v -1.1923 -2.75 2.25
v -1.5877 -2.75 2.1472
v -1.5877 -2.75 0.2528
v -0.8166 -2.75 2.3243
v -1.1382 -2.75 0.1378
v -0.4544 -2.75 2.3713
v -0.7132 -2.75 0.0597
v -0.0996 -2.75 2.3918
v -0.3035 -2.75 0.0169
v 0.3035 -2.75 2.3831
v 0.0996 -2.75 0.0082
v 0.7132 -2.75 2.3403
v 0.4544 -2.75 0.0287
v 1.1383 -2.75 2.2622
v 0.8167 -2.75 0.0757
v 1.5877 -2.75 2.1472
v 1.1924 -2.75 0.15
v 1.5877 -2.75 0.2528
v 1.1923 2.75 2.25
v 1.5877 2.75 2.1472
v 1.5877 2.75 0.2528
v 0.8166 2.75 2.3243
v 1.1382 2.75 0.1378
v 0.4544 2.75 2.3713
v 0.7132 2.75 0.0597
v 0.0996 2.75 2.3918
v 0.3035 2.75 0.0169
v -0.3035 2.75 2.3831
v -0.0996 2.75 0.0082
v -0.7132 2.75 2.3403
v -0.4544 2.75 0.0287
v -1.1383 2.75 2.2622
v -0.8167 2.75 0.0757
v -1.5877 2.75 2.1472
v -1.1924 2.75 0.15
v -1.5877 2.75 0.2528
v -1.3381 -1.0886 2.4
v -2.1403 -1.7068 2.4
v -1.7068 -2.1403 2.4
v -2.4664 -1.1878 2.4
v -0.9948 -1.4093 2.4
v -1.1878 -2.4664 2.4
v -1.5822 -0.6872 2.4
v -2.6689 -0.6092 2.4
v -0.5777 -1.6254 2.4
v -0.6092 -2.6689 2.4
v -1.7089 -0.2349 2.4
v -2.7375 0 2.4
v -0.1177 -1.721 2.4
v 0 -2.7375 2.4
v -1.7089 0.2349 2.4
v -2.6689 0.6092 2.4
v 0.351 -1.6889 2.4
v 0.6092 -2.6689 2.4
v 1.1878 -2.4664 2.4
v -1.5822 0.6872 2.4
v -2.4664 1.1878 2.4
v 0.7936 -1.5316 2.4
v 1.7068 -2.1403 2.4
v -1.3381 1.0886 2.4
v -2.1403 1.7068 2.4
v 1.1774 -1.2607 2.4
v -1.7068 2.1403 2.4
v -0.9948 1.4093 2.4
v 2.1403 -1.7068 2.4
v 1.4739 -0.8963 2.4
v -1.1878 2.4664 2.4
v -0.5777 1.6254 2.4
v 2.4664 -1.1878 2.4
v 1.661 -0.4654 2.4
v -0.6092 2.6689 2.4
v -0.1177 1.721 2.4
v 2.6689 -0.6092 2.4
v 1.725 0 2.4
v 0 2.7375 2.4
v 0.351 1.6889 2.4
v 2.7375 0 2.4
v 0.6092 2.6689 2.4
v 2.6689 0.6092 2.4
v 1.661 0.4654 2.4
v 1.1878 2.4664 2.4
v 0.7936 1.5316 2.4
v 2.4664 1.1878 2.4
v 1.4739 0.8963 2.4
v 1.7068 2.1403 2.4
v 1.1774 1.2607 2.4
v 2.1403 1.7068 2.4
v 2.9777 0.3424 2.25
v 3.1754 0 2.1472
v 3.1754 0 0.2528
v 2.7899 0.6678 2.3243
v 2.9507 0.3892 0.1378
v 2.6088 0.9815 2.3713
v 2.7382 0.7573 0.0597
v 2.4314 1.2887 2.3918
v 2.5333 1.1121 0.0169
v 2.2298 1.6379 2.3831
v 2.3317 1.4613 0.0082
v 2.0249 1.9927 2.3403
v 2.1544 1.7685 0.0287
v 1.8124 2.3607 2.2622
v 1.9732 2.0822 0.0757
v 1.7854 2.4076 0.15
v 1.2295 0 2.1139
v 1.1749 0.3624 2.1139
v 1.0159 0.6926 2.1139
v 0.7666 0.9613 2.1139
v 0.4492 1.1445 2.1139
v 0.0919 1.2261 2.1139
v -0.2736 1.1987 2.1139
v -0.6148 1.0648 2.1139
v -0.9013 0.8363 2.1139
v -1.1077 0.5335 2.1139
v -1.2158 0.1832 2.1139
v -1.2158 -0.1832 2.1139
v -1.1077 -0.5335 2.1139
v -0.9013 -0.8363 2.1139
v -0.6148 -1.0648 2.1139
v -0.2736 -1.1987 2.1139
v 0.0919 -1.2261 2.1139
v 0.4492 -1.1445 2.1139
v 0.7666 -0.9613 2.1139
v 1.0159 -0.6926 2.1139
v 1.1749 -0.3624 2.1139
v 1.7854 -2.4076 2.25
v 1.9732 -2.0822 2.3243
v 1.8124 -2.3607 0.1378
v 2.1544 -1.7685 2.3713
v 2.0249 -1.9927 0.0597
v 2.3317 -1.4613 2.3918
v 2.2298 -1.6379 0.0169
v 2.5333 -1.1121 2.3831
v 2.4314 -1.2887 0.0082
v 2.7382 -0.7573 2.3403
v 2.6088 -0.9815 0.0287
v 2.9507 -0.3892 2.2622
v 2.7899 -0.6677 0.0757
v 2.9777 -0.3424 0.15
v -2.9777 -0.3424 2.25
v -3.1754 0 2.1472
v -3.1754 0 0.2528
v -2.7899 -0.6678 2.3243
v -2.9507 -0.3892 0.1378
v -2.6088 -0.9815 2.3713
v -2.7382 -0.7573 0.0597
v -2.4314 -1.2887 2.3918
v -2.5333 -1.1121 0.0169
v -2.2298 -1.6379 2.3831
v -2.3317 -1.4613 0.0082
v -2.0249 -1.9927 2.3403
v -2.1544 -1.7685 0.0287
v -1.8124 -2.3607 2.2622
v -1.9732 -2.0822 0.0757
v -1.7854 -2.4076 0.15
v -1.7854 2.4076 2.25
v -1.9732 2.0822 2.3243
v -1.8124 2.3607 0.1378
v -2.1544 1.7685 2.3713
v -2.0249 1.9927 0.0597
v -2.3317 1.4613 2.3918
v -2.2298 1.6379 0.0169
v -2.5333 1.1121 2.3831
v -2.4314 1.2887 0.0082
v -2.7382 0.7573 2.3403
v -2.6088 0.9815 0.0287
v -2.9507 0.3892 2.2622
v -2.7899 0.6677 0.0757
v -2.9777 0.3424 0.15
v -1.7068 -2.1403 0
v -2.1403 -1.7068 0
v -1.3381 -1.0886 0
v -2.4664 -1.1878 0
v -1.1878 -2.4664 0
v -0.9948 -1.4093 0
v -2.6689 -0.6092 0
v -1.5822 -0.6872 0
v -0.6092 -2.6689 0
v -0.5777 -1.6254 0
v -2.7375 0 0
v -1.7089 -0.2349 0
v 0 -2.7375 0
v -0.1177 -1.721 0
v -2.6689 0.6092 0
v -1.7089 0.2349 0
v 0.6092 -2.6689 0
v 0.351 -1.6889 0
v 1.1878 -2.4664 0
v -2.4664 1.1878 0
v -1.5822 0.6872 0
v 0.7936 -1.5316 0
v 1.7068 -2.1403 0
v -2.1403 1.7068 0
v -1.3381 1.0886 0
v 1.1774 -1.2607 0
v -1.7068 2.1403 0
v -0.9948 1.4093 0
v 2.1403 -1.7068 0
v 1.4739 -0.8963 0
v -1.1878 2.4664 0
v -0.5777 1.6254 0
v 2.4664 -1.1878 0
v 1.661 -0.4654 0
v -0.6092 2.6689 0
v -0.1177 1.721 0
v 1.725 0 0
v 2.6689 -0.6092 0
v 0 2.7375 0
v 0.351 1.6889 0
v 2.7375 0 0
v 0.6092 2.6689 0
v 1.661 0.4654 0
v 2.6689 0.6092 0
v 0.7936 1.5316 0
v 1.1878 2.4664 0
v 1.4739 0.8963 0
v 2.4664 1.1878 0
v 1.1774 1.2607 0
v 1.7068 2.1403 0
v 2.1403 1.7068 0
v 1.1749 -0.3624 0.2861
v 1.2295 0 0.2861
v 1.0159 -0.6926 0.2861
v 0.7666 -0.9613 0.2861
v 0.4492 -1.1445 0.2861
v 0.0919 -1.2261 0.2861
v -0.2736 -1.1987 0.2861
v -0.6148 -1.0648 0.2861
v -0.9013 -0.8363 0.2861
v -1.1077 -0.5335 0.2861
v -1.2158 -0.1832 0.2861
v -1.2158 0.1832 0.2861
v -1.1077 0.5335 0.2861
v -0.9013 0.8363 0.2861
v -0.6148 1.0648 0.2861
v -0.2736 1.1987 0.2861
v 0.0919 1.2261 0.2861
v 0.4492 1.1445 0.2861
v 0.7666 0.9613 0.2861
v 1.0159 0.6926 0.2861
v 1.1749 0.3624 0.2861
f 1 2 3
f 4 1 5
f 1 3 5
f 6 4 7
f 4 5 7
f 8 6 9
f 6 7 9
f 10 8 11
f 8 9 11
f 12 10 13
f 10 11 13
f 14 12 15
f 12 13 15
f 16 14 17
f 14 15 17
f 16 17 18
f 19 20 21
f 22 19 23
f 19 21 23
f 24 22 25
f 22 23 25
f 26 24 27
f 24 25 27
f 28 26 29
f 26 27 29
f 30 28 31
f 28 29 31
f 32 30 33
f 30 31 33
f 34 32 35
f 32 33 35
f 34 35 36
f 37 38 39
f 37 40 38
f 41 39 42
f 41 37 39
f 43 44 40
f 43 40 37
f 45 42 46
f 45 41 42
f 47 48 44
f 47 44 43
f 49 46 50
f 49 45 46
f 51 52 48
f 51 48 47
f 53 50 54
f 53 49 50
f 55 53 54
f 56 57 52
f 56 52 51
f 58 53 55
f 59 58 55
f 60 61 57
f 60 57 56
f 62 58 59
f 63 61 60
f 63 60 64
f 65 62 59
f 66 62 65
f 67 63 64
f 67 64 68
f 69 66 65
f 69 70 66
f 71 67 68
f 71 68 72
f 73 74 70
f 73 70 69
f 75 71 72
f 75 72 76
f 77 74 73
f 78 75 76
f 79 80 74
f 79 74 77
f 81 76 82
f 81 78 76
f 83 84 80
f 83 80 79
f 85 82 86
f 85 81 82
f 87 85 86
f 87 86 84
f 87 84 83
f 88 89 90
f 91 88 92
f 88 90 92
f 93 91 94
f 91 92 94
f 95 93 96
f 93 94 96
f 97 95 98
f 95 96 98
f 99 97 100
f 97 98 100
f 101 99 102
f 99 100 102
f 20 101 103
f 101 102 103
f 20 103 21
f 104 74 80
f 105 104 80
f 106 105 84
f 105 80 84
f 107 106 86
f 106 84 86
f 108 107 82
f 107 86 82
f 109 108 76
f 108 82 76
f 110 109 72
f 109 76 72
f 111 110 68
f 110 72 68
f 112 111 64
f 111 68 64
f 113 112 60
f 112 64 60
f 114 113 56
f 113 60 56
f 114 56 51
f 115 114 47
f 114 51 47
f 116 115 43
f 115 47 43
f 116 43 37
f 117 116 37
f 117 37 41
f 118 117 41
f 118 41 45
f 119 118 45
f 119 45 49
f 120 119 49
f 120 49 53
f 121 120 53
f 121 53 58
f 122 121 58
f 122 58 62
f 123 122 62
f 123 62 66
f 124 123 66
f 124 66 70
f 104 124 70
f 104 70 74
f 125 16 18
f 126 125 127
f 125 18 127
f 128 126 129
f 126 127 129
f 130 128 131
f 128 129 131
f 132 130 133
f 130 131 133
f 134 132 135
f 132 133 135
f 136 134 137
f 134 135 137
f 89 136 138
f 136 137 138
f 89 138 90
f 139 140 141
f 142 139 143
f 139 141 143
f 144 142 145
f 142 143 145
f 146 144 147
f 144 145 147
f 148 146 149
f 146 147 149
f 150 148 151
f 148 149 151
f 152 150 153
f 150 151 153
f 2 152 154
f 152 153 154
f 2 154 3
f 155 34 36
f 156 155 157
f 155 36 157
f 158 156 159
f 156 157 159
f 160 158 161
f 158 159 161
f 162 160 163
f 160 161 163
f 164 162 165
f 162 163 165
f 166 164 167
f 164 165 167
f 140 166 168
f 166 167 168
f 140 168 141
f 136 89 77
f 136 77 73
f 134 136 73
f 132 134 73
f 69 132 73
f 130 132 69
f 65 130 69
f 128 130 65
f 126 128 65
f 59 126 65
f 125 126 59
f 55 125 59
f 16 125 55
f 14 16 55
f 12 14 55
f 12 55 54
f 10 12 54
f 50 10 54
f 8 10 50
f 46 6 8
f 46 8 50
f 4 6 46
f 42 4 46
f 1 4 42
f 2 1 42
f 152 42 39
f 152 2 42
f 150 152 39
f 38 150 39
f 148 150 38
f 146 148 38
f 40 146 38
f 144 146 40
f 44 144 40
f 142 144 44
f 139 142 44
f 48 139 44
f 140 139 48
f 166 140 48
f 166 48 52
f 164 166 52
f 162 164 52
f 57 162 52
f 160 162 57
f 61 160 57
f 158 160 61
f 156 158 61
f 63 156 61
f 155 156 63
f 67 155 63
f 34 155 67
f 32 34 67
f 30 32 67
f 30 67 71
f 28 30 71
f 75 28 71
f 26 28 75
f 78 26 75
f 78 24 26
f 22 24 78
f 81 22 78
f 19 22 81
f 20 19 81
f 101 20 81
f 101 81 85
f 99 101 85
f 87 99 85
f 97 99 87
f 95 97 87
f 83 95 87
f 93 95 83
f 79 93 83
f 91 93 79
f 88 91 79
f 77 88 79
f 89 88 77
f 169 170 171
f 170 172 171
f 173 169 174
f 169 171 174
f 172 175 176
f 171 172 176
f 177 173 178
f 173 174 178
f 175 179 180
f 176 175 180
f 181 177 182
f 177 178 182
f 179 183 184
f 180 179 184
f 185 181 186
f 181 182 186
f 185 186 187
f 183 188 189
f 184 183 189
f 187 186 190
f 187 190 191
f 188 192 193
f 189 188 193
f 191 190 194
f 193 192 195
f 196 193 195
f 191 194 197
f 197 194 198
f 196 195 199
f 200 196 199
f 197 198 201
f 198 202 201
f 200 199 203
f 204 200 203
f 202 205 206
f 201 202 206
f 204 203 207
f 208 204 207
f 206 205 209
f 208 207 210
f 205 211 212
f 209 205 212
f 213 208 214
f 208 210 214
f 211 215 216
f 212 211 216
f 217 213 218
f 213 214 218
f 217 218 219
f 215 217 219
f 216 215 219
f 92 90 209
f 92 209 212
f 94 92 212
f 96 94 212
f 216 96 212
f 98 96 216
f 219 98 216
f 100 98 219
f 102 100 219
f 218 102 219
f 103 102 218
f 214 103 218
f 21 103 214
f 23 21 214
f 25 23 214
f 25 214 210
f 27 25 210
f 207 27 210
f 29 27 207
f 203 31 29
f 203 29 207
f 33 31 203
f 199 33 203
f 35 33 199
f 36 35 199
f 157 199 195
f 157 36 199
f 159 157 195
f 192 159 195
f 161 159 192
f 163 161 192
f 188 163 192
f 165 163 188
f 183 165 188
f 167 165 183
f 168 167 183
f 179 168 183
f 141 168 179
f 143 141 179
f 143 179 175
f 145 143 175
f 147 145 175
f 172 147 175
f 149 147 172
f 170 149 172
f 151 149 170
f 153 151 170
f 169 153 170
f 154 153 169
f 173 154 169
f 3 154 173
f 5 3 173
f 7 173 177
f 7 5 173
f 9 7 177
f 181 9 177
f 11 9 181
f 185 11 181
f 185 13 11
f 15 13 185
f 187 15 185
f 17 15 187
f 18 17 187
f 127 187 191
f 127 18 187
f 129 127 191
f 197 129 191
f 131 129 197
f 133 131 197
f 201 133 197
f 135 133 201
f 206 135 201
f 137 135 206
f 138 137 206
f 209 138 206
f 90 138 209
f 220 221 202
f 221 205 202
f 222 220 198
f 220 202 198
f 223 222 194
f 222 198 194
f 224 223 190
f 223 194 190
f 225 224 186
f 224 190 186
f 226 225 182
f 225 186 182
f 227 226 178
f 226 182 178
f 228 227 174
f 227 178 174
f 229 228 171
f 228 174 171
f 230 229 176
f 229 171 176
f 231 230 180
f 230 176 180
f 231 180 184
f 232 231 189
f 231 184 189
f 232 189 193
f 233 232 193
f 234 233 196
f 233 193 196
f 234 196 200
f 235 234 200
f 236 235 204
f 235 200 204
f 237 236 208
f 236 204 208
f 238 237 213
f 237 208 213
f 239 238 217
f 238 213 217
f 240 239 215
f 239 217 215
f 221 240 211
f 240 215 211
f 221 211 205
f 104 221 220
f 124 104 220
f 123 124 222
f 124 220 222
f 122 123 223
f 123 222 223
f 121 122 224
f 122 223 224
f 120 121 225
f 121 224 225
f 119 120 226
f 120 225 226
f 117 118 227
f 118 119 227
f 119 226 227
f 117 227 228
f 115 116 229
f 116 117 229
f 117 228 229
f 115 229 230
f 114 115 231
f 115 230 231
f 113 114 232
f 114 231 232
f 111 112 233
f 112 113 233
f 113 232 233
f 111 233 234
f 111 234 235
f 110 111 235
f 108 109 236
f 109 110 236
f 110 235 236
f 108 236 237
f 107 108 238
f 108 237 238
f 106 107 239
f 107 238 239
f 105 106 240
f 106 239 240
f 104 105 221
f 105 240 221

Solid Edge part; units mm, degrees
sketch "Sketch1" plane through (0, 0, 0) normal (0, 0, 1) x (1, 0, 0)
  circle A0 centre (0, 0) radius 1.2295
  circle A1 centre (0, 0) radius 3.1754
  dimension "D1" = 2.75
  dimension "D2" = 2.459
extrude "Protrusion1" add sketch "Sketch1" along normal blind 2.4
sketch "Sketch2" plane through (0, 0, 0) normal (0, 0, 1) x (1, 0, 0)
  line L0 (3.1754, 0) -> (1.5877, 2.75)
  arc A0 (1.5877, 2.75) -> (3.1754, 0) centre (0, 0) cw
  dimension "D1" = 2.75
extrude "ExtrudedCutout_1" cut sketch "Sketch2" along normal blind 2.4
pattern_circular "Pattern1" count 6 over 360 about axis through (0, 0, 0) along (0, 0, -1) of "ExtrudedCutout_1"
cosmetic_thread "Thread_1" size "M3" thread depth 2.4
sketch "Sketch3" plane through (0, 0, 0) normal (0, -1, 0) x (1, 0, 0)
  line L0 (3.1755, 0.2529) -> (2.7375, 0)
  line L1 (2.7375, 0) -> (3.1755, 0)
  line L2 (3.1755, 0) -> (3.1755, 0.2529)
  line L3 (2.7375, 2.4) -> (3.1755, 2.4)
  line L4 (3.1755, 2.4) -> (3.1755, 2.1471)
  line L5 (3.1755, 2.1471) -> (2.7375, 2.4)
  dimension "D1" = 2.4
  dimension "D2" = 2.7375
  dimension "D3" = 3.1755
revolve "RevolvedCutout_1" cut sketch "Sketch3" angle 360 about axis through (0, 0, 8.4) along (0, 0, -1)
chamfer "Chamfer_1" distance 0.4955 angle 30 1 edges at (-1.2295, 0, 0) measured on face at (-1.8798, -1.7702, 0)
chamfer "Chamfer_2" distance 0.4955 angle 30 1 edges at (-1.2295, 0, 2.4) measured on face at (-1.8798, -1.7702, 2.4)
properties material "Steel"
